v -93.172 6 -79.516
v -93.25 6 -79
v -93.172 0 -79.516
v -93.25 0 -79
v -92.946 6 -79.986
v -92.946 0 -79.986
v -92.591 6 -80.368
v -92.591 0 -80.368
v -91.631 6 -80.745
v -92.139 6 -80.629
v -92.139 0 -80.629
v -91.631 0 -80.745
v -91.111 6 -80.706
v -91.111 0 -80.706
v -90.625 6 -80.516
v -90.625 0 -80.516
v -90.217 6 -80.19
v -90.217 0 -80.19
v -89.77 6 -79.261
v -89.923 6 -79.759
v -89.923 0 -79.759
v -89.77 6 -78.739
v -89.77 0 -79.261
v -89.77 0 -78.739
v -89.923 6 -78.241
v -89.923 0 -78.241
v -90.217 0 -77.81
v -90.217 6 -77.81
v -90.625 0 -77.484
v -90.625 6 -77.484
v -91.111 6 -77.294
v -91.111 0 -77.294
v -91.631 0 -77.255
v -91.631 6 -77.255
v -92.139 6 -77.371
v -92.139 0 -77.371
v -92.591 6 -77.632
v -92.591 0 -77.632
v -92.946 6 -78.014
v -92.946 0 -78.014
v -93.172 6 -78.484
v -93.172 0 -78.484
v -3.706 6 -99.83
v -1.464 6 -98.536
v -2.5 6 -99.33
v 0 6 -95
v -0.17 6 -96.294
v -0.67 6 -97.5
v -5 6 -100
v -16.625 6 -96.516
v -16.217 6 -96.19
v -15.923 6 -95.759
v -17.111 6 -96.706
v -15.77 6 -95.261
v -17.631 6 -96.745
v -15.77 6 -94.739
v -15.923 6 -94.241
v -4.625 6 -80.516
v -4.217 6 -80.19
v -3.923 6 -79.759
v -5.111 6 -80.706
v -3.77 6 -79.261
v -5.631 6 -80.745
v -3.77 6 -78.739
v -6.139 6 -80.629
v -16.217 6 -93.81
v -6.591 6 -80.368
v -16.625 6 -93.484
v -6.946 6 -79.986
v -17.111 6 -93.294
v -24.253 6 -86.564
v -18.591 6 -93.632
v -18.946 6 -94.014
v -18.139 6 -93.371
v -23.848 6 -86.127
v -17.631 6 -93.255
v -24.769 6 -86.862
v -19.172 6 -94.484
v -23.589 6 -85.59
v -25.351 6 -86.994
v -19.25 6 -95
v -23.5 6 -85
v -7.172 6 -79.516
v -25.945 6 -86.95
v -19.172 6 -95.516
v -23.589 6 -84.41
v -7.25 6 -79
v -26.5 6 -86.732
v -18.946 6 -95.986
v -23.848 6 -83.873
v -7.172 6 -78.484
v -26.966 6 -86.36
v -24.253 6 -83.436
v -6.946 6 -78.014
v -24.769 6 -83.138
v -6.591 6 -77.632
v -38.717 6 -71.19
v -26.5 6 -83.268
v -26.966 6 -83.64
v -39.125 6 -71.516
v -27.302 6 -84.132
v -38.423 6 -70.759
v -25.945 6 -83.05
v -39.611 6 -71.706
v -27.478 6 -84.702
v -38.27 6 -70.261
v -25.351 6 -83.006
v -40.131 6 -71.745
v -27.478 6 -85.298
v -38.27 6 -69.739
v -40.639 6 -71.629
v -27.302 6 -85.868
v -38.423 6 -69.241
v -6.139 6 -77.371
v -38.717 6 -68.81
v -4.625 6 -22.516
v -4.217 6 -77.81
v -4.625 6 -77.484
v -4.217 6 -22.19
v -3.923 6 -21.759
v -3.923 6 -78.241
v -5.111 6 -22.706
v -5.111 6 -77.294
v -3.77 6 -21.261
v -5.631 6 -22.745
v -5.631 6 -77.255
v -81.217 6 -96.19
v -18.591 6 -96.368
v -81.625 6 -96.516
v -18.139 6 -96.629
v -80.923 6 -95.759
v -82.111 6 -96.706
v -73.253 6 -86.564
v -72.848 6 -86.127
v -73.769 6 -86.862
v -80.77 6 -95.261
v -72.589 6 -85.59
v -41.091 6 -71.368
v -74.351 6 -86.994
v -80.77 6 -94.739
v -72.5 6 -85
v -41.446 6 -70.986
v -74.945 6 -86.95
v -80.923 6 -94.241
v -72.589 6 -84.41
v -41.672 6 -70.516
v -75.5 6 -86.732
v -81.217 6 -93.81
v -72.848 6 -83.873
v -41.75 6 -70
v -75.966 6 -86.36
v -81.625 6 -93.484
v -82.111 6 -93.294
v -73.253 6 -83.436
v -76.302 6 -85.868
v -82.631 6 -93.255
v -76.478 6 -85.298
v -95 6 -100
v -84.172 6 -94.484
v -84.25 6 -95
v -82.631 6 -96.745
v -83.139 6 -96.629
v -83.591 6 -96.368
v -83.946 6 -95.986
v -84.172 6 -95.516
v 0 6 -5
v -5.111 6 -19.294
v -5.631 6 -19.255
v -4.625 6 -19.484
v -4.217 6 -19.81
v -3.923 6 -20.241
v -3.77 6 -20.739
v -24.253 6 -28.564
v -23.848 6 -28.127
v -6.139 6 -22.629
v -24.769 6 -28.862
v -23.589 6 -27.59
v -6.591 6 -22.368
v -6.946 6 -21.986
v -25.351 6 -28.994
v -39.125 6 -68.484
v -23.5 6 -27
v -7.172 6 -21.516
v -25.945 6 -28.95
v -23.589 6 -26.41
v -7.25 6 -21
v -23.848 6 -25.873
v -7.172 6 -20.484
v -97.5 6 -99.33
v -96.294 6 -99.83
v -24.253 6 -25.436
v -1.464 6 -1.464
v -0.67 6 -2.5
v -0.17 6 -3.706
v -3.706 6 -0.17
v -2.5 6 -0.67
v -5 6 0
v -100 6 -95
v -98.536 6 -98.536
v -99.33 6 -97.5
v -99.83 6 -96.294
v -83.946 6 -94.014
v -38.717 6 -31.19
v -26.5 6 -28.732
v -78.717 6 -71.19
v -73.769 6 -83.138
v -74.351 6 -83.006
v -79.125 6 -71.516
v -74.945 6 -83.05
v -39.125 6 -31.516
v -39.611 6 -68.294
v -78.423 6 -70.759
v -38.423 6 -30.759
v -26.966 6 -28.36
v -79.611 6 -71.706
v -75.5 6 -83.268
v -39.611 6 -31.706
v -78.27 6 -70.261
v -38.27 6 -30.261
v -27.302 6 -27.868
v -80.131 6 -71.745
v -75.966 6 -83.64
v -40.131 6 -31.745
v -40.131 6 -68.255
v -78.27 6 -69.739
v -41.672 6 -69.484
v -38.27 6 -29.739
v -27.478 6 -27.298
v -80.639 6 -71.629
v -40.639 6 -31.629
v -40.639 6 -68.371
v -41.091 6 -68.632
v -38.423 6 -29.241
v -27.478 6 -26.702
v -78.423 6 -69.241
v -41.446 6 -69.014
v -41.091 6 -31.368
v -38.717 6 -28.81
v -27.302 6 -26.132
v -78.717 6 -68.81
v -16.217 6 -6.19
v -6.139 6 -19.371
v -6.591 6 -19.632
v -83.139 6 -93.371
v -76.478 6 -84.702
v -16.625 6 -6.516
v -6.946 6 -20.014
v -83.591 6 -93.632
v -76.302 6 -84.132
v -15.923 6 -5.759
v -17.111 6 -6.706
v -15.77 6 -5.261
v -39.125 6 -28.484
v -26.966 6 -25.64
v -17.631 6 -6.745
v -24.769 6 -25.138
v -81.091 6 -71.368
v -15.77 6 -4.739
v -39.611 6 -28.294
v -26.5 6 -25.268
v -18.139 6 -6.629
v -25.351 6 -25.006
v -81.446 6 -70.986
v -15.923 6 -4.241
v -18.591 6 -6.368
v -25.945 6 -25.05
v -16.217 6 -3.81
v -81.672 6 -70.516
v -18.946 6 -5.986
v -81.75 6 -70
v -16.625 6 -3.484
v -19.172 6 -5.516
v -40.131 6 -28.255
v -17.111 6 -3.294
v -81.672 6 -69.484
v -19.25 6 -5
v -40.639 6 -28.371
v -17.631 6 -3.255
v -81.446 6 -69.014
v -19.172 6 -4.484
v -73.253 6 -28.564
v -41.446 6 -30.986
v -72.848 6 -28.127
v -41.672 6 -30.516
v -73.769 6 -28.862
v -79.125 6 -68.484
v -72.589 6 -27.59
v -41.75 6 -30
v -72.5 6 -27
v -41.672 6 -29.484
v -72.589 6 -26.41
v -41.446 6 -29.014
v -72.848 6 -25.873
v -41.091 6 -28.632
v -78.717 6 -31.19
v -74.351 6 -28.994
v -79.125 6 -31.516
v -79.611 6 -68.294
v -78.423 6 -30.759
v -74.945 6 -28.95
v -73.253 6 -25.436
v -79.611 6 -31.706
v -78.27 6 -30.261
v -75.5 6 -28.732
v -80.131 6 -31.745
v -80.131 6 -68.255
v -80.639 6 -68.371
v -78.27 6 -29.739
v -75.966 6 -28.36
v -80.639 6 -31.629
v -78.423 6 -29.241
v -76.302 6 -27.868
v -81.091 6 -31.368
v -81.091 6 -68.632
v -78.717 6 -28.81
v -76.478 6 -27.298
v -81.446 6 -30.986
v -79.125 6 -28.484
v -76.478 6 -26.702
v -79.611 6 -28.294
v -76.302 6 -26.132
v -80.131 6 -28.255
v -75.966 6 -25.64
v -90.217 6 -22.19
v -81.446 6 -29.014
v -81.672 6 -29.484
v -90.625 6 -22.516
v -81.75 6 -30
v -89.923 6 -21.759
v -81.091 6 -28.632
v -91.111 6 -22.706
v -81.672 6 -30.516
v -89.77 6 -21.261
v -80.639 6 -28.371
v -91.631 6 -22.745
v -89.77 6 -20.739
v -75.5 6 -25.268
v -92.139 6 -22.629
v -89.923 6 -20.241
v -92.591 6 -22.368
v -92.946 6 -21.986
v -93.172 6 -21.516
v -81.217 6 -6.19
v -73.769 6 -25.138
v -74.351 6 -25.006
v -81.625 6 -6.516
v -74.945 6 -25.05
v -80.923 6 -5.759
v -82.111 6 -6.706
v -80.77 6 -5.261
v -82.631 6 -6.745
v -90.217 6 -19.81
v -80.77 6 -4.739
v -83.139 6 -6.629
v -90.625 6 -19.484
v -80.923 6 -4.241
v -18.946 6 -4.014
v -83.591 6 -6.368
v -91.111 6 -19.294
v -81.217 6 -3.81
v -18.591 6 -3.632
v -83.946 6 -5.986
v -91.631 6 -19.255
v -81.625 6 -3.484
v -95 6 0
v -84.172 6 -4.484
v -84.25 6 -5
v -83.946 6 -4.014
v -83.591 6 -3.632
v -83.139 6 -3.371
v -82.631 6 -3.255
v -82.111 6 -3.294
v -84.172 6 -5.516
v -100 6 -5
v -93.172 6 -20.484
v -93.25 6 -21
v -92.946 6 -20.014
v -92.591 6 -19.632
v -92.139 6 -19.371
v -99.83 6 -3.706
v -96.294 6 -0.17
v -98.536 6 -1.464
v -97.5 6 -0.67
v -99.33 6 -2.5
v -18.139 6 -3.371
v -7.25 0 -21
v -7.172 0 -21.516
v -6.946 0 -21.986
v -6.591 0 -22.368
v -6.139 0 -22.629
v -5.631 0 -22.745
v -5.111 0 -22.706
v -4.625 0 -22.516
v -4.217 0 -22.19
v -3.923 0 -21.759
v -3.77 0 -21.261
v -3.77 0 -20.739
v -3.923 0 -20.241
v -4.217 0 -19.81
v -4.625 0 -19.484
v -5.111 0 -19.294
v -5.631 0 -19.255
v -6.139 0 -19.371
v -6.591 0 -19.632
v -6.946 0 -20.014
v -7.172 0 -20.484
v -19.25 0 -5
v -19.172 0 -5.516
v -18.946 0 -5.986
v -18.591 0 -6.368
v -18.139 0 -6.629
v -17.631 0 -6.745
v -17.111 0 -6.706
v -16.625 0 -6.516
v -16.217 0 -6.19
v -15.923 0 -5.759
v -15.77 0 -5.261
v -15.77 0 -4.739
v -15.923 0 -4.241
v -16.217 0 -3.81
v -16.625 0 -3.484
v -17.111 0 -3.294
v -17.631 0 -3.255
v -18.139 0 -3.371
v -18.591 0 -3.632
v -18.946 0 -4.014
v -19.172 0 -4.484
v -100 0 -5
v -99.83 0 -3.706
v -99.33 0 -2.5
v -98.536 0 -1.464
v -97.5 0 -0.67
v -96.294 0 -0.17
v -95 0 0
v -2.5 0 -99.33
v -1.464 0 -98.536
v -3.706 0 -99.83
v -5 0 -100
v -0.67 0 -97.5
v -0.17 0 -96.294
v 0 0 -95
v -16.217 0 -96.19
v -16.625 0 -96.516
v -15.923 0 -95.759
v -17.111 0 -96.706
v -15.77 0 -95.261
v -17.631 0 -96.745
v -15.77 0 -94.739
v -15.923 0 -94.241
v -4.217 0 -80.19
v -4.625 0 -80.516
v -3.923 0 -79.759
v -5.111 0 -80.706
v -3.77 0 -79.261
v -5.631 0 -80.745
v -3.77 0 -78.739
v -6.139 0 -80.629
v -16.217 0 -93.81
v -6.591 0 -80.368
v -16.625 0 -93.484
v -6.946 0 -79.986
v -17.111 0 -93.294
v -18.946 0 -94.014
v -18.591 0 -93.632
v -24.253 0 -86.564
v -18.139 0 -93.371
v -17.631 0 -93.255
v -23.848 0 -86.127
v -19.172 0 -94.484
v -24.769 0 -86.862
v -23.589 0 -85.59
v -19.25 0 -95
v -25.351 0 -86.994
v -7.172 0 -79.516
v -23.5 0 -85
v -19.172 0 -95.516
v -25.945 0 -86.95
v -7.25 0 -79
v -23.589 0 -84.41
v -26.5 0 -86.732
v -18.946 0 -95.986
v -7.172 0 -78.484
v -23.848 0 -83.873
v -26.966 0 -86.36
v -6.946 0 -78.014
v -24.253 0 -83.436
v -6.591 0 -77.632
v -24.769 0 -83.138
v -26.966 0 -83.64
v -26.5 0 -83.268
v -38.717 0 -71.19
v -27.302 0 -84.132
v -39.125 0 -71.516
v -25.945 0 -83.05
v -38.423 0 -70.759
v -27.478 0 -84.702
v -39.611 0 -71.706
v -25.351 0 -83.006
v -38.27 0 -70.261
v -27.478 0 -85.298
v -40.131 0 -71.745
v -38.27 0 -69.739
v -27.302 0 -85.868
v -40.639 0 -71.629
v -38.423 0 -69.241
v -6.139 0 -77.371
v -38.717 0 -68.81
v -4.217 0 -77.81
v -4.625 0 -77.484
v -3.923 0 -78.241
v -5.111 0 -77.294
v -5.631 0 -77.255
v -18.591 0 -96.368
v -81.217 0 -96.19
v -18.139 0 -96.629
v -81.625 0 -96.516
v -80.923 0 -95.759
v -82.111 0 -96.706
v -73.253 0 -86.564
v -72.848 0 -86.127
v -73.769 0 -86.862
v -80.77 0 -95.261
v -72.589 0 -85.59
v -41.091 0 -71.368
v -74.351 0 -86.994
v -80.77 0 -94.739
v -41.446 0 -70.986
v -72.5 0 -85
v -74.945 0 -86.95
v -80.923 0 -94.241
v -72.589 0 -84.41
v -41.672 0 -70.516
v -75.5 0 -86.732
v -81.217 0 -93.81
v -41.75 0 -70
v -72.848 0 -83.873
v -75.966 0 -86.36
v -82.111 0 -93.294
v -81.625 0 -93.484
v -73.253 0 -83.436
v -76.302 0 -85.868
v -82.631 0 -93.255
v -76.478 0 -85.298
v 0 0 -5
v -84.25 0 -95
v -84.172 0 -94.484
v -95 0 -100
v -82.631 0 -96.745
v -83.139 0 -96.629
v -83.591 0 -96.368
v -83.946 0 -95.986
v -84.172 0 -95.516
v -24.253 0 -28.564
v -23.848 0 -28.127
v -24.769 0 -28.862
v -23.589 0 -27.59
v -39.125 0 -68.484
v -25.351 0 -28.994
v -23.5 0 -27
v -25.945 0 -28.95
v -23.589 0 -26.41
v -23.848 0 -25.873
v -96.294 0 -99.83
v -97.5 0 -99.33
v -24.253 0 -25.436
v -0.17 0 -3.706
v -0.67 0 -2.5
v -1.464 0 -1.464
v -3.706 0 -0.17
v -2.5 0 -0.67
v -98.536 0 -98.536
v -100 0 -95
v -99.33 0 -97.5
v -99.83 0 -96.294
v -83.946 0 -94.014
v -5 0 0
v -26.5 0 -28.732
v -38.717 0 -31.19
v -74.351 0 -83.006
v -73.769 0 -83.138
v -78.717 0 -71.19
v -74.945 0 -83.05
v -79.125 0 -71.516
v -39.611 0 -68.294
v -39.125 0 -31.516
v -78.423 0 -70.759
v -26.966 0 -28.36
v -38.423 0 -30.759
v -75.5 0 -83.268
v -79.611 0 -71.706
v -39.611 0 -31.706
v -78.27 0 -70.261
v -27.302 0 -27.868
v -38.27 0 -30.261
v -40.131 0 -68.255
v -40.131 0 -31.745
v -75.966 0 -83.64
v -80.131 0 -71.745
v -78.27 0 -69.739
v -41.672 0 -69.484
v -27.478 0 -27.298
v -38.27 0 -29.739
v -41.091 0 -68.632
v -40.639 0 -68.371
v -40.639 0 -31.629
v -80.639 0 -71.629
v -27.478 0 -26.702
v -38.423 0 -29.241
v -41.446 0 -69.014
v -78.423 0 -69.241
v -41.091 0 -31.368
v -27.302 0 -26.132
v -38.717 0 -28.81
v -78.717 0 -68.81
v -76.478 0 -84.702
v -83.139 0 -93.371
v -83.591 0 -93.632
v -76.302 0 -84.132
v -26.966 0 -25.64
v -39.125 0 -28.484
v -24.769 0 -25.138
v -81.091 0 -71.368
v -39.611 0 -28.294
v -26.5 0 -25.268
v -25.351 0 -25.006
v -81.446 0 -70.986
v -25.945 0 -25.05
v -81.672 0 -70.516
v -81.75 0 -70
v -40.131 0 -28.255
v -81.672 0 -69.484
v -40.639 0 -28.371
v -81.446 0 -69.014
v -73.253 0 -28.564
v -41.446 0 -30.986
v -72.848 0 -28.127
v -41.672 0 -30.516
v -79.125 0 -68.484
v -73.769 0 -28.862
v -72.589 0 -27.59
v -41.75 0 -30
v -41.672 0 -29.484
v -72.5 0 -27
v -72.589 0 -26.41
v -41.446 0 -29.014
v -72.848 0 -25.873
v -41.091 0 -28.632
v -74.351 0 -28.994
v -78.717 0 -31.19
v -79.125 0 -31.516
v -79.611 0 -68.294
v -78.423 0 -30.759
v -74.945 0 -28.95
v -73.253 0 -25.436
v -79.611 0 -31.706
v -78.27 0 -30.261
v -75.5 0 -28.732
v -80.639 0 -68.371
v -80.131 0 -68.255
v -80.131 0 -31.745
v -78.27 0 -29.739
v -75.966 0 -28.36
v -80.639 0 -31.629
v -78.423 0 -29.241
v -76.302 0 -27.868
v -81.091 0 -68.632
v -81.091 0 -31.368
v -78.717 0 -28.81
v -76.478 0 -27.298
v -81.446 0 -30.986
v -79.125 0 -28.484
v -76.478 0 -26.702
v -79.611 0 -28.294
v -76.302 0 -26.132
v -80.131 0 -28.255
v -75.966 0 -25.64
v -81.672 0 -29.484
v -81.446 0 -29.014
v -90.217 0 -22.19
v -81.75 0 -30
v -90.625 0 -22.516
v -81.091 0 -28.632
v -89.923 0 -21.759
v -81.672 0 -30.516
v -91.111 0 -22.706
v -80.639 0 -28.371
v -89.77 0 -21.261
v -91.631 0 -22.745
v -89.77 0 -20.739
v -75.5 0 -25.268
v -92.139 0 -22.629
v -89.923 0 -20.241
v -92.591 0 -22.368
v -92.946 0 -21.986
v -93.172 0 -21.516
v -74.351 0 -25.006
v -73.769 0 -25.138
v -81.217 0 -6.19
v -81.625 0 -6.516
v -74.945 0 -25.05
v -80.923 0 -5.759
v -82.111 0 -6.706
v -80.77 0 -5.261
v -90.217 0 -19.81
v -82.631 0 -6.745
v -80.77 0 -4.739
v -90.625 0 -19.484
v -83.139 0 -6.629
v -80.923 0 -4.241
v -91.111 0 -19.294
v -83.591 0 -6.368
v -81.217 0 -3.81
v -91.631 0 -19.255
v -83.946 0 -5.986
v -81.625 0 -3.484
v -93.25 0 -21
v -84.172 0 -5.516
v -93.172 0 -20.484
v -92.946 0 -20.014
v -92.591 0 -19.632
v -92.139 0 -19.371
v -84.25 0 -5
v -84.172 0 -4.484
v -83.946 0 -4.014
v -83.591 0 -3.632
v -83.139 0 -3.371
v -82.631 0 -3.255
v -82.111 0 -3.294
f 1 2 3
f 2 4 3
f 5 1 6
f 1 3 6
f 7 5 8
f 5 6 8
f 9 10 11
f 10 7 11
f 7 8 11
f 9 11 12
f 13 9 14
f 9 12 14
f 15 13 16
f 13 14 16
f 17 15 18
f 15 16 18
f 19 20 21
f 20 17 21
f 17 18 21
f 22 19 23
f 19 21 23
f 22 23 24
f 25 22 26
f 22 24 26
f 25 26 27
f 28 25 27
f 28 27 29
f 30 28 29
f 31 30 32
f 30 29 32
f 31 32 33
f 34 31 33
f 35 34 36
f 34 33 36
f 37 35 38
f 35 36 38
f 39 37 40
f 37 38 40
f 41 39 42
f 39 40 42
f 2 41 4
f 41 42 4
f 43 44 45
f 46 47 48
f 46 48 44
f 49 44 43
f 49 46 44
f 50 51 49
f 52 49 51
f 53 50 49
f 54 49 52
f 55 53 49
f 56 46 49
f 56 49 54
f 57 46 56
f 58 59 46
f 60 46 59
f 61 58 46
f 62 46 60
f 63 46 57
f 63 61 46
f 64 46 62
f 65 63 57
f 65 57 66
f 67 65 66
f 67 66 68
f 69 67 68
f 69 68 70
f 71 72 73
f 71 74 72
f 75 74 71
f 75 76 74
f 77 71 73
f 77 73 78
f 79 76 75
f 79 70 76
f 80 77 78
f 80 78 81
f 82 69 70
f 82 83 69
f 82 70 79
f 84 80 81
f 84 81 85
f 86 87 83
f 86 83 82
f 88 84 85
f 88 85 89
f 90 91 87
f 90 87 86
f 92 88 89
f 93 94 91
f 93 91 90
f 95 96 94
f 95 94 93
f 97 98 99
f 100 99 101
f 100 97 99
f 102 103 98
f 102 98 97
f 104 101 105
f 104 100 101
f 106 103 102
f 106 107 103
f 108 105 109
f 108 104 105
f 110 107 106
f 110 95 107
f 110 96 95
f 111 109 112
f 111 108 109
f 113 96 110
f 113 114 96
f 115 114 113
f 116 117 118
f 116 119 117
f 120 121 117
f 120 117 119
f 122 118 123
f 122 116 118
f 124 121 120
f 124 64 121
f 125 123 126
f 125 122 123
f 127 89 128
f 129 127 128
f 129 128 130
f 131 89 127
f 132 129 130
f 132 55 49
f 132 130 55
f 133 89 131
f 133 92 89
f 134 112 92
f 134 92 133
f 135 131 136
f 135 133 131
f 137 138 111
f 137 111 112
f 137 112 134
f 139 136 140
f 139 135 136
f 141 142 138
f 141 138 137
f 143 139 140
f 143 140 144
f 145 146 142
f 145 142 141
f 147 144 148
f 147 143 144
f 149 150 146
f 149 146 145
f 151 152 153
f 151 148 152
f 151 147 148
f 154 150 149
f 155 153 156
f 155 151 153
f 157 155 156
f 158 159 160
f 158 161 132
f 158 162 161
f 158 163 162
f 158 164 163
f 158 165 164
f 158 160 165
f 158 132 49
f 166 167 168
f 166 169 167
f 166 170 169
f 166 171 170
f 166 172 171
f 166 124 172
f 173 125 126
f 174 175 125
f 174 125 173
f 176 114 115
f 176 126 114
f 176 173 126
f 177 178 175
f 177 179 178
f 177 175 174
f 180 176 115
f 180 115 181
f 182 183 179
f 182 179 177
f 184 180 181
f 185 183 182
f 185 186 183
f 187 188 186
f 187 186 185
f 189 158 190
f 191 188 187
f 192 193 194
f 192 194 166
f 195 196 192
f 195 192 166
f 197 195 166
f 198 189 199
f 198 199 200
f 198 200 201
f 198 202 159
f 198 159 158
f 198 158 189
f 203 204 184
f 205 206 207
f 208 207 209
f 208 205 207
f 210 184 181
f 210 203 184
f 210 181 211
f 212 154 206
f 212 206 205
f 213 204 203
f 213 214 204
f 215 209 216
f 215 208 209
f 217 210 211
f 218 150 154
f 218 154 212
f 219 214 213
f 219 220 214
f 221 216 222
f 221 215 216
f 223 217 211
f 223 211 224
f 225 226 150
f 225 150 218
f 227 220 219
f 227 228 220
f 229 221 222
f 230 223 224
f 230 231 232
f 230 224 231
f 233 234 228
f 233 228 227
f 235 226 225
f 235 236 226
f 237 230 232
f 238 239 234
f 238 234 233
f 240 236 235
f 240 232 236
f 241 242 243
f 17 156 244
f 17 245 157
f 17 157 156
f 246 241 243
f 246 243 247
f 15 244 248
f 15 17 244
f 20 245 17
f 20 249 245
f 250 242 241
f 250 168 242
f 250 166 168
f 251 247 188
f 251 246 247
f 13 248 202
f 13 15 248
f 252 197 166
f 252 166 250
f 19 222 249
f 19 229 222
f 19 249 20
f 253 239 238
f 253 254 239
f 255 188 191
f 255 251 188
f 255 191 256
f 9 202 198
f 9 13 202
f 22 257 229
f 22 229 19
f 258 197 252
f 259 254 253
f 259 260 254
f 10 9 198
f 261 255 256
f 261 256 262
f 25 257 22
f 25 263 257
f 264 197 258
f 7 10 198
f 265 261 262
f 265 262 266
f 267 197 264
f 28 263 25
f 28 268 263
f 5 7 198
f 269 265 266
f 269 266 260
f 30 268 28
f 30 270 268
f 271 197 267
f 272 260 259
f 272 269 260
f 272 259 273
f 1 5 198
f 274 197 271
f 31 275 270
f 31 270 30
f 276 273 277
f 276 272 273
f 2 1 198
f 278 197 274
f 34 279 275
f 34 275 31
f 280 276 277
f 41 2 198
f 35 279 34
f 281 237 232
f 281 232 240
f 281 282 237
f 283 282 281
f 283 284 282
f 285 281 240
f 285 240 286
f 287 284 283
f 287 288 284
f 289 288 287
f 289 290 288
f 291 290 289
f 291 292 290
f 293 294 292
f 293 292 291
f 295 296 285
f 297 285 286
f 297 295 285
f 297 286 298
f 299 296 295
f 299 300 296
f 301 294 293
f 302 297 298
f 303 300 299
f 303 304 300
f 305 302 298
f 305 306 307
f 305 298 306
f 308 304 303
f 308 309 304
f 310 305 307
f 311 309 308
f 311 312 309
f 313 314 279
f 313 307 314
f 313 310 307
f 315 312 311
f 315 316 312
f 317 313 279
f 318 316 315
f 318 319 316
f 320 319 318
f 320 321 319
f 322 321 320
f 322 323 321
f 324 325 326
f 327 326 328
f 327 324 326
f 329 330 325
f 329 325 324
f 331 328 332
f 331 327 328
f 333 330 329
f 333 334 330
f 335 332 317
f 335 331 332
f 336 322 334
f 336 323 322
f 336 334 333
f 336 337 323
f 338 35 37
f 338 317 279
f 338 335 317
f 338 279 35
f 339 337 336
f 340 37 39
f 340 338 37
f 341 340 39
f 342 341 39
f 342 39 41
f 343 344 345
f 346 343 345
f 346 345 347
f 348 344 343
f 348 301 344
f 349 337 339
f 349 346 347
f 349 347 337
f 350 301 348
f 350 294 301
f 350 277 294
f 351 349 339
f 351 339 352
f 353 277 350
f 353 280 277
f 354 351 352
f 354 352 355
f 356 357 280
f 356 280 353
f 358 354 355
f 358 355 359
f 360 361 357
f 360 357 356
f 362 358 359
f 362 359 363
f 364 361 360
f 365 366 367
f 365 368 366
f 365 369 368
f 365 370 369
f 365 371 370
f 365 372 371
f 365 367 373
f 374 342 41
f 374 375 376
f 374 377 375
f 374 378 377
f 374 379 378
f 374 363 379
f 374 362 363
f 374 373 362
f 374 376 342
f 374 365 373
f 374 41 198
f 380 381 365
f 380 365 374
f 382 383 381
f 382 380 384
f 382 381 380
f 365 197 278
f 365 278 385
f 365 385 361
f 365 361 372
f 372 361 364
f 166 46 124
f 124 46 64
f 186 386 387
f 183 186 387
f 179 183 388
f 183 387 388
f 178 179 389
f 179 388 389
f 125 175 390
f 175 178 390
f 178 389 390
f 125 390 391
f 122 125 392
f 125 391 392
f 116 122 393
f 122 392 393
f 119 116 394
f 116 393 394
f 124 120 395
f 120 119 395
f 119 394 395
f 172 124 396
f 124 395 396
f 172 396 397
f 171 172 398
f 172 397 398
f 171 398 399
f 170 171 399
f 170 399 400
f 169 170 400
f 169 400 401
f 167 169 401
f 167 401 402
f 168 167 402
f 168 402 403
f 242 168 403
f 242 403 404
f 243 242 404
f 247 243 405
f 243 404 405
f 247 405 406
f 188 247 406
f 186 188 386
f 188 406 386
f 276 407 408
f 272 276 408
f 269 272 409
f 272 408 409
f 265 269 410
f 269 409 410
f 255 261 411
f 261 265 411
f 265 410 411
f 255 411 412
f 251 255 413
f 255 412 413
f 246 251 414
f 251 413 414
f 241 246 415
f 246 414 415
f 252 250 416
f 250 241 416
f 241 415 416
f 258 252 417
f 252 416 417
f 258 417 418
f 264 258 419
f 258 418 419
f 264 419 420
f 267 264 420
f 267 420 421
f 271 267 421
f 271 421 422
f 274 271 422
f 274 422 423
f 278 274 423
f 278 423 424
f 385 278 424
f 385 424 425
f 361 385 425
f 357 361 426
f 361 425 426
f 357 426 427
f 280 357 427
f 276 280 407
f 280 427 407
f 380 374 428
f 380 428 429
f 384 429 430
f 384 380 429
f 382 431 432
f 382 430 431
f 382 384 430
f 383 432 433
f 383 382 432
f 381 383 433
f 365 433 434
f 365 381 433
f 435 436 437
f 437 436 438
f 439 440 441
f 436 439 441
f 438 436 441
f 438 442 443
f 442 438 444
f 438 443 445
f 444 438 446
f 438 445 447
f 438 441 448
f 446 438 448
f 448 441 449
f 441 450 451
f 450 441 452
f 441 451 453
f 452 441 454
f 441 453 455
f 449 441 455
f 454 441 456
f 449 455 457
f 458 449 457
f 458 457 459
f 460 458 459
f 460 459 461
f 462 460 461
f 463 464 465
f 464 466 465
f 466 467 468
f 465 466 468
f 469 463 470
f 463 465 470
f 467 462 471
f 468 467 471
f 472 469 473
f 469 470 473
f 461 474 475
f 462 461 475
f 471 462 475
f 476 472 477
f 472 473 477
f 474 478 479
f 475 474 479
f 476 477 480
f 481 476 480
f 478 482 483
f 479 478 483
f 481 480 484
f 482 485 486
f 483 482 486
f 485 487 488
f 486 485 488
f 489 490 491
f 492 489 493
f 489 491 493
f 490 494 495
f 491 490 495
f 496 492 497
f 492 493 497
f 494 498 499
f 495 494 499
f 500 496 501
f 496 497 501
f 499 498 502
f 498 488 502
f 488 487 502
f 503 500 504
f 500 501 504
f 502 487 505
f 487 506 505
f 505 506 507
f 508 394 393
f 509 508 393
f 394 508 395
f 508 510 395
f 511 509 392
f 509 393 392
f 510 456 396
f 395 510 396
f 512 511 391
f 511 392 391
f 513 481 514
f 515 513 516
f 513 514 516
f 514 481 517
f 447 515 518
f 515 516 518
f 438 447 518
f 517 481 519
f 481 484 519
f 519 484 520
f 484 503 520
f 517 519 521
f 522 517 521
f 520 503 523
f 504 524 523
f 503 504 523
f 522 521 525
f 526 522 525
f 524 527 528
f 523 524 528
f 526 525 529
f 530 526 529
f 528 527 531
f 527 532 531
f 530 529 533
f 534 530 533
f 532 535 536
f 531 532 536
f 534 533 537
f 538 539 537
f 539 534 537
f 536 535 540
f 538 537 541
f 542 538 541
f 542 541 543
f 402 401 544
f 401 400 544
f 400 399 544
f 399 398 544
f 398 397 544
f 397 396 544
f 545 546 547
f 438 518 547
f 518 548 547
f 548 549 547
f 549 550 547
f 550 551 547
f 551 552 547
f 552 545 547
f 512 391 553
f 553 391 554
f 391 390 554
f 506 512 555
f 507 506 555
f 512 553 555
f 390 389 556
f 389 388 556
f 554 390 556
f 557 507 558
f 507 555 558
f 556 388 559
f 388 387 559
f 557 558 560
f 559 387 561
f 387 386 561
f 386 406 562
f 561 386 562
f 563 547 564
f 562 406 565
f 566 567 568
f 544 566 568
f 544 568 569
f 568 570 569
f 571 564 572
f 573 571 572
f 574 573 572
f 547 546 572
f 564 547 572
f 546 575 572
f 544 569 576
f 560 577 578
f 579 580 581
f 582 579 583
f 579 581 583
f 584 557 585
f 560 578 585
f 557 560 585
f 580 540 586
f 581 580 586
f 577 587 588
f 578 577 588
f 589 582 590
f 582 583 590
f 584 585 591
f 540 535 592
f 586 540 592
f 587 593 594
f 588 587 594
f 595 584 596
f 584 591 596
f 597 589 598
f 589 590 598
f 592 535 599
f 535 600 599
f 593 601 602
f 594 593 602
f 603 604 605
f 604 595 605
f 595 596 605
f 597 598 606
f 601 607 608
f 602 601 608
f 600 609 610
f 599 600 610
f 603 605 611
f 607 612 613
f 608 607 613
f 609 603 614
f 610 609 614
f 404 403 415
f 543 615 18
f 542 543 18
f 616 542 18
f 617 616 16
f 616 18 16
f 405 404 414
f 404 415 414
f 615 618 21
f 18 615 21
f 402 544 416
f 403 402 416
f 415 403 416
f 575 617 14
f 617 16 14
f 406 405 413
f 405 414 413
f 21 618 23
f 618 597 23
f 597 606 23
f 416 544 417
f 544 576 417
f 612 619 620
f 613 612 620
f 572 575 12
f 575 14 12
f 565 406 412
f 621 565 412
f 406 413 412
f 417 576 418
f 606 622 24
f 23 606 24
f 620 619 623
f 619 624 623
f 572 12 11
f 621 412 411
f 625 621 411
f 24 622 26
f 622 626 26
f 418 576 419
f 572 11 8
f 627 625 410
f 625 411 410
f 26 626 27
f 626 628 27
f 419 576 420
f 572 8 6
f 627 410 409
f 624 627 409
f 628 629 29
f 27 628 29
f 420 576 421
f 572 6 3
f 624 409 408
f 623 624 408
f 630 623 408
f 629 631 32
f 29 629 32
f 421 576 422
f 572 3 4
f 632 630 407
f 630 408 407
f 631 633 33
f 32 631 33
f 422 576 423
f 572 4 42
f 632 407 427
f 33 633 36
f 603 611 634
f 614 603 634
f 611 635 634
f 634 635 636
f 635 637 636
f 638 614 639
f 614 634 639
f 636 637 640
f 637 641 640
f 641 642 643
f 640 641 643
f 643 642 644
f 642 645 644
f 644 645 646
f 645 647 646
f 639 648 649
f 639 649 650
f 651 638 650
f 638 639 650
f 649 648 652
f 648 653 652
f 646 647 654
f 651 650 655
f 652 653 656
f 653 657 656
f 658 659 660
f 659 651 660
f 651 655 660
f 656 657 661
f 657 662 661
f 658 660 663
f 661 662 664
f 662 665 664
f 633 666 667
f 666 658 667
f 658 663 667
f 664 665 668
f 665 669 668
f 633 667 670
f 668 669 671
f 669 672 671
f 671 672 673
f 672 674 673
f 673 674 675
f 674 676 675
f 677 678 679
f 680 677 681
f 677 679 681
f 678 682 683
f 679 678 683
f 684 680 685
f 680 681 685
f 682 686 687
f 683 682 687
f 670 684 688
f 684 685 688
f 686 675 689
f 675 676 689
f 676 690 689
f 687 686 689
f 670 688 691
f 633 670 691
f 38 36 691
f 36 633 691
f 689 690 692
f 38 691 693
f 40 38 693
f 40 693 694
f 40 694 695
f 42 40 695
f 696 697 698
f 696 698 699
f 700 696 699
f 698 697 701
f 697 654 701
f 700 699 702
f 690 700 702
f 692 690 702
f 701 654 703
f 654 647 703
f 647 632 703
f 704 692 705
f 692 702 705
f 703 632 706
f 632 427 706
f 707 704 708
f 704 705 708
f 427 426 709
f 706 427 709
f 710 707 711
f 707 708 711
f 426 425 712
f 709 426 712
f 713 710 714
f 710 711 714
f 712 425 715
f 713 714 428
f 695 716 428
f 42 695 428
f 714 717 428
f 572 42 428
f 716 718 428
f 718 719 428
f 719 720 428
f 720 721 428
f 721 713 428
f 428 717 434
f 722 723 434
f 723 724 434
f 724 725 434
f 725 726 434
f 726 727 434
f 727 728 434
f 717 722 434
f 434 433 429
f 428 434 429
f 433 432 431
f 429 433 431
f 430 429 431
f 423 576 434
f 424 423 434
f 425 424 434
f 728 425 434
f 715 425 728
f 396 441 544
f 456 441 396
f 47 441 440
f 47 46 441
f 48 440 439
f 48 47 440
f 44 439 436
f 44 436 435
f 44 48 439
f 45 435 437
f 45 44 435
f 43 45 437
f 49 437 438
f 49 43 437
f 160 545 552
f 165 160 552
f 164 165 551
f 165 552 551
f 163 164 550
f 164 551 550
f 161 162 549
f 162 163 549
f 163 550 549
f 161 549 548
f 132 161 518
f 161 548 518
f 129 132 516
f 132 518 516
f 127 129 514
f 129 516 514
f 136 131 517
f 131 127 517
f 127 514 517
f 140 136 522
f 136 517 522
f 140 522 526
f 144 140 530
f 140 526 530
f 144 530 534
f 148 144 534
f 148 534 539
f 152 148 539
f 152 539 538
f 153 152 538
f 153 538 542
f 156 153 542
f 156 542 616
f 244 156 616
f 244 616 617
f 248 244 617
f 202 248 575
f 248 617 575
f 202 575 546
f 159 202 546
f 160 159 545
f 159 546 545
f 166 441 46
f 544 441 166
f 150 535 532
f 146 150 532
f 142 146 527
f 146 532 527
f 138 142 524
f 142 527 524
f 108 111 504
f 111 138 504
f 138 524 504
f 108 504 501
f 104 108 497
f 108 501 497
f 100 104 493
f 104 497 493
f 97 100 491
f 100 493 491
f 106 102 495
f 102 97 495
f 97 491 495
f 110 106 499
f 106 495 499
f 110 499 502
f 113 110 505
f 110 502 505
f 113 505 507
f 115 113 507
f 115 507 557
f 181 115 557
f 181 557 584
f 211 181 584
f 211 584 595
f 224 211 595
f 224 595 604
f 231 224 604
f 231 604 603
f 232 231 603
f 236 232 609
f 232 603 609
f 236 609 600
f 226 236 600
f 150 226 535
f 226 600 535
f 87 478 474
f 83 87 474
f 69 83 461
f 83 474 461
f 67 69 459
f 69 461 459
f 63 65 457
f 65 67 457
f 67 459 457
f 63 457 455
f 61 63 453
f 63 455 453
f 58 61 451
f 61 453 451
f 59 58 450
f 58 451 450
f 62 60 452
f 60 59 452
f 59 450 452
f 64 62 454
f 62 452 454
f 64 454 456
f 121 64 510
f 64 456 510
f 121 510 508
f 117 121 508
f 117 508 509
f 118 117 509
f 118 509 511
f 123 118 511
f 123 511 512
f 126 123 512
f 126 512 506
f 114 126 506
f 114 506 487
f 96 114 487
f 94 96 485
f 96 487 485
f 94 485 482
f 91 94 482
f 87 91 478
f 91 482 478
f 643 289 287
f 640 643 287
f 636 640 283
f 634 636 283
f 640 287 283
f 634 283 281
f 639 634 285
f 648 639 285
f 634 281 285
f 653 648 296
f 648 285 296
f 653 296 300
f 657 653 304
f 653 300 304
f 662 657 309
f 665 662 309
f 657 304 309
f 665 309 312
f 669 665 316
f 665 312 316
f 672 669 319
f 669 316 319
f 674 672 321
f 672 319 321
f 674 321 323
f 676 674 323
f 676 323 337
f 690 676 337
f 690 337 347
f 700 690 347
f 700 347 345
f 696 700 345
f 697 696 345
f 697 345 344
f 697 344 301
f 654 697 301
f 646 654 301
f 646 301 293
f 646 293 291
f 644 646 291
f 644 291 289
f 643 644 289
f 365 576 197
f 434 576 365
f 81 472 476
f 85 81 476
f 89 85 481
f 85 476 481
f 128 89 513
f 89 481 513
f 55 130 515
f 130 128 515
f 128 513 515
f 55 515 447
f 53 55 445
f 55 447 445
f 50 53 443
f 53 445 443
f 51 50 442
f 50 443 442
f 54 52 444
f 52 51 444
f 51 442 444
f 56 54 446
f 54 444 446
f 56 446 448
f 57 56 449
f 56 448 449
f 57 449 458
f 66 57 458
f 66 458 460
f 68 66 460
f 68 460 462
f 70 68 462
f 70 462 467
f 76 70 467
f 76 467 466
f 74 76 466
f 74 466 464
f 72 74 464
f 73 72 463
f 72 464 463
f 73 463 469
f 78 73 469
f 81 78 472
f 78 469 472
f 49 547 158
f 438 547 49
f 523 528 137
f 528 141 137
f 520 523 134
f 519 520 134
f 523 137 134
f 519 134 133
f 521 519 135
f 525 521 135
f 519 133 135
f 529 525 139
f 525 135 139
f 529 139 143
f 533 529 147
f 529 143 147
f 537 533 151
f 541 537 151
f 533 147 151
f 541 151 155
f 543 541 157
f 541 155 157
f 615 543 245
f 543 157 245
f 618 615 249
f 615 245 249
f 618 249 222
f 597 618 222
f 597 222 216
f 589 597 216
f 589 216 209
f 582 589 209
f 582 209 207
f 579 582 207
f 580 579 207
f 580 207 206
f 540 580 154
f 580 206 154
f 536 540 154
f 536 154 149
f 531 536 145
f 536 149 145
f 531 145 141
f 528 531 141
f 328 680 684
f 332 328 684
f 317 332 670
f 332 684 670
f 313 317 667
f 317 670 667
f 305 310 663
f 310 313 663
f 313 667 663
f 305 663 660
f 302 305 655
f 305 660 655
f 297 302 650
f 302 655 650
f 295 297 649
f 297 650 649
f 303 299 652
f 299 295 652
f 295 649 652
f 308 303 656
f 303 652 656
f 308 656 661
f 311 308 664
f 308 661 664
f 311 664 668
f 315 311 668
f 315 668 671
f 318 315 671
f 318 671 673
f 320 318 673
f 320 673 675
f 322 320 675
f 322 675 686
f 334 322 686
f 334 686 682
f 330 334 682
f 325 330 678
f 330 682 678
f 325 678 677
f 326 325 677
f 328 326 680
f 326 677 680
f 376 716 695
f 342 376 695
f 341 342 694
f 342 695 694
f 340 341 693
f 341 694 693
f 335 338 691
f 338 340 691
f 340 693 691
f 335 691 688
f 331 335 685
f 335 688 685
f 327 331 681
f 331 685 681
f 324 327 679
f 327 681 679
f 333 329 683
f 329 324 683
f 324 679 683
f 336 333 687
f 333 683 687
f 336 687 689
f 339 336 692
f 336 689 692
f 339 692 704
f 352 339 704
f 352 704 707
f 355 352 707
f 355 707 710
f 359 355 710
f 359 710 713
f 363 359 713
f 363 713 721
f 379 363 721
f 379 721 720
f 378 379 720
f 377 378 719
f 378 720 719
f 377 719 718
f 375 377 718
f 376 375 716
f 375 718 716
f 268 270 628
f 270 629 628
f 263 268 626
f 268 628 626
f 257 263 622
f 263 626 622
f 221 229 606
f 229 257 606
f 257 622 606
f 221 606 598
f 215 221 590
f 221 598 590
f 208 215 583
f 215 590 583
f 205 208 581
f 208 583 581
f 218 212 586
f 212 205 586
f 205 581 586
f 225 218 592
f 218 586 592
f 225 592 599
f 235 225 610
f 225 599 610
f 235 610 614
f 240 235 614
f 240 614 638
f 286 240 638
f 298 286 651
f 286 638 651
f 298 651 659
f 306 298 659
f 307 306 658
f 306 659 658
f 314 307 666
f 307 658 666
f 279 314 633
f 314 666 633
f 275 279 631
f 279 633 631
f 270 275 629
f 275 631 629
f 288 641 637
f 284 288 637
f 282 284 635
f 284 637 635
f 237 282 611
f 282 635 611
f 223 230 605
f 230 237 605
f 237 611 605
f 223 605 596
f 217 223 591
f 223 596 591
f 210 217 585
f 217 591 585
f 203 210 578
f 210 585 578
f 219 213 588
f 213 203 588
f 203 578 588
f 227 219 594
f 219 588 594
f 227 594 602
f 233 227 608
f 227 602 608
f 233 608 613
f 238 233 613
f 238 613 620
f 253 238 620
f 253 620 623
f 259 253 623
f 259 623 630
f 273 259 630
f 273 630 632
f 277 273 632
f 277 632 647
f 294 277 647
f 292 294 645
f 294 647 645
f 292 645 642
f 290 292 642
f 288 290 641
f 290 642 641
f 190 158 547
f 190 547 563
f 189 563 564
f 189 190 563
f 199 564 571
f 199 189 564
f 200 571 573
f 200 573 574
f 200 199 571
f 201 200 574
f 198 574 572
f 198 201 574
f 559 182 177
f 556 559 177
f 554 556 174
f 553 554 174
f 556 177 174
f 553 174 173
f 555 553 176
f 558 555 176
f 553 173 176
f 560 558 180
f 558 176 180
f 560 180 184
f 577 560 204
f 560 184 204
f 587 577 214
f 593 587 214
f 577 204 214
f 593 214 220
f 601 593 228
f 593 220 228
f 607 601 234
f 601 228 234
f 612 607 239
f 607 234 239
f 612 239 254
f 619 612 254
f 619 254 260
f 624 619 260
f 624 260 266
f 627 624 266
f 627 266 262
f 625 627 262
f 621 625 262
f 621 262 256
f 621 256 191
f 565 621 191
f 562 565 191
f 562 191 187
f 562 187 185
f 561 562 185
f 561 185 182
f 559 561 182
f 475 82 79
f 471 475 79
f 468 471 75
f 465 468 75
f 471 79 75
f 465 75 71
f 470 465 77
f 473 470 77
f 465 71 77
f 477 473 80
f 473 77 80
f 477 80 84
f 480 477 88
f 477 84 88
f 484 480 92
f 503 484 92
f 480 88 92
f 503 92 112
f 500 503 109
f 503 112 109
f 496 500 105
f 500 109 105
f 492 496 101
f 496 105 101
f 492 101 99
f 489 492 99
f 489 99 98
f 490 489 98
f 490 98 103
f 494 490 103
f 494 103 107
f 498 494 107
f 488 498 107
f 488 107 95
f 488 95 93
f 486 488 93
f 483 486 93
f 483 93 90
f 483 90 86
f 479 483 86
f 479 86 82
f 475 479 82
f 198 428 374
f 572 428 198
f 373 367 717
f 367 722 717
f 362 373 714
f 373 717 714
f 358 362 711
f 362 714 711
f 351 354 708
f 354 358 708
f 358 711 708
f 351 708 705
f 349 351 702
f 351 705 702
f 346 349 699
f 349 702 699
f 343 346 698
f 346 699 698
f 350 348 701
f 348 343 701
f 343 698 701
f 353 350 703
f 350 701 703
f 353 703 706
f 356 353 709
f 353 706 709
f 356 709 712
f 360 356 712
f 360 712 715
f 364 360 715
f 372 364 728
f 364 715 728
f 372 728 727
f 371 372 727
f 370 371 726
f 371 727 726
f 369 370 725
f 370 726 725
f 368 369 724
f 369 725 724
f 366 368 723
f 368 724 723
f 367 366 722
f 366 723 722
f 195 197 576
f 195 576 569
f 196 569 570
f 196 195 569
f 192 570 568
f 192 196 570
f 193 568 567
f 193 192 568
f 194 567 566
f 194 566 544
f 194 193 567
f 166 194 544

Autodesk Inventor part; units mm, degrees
ref_plane "YZ Plane" through (0, 0, 0) normal (1, 0, 0) x (0, 1, 0)
ref_plane "XZ Plane" through (0, 0, 0) normal (0, 1, 0) x (-1, 0, 0)
ref_plane "XY Plane" through (0, 0, 0) normal (0, 0, 1) x (1, 0, 0)
sketch "Sketch2" plane through (0, 0, 0) normal (0, 1, 0) x (-1, 0, 0)
  line L0 (0, 0) -> (100, 0)
  line L1 (100, 0) -> (100, -100)
  line L2 (100, -100) -> (0, -100)
  line L3 (0, -100) -> (0, 0)
  circle A0 centre (82.5, -5) radius 1.75
  circle A1 centre (82.5, -95) radius 1.75
  circle A2 centre (17.5, -5) radius 1.75
  circle A3 centre (17.5, -95) radius 1.75
  circle A4 centre (80, -30) radius 1.75
  circle A5 centre (91.5, -21) radius 1.75
  circle A6 centre (91.5, -79) radius 1.75
  circle A7 centre (5.5, -21) radius 1.75
  circle A8 centre (5.5, -79) radius 1.75
  line L4 (50, 0) -> (50, -100)
  circle A9 centre (40, -30) radius 1.75
  circle A10 centre (80, -70) radius 1.75
  circle A11 centre (40, -70) radius 1.75
  dimension "d13" = 100
  dimension "d14" = 100
  dimension "d15" = 3.5
  dimension "d16" = 17.5
  dimension "d17" = 5
  dimension "d20" = 90
  dimension "d23" = 65
  dimension "d26" = 3.5
  dimension "d27" = 20
  dimension "d28" = 30
  dimension "d32" = 3.5
  dimension "d35" = 58
  dimension "d38" = 86
  dimension "d41" = 8.5
  dimension "d42" = 21
  dimension "d51" = 40
  dimension "d54" = 40
extrude "Extrusion2" add sketch "Sketch2" along normal blind 6
fillet "Fillet2" radius 5 4 edges at (0, 3, -100) (-100, 3, -100) (0, 3, 0) (-100, 3, 0)
sketch "Sketch3" plane through (0, 6, 0) normal (0, 1, 0) x (1, 0, 0)
  circle A0 centre (-74.5, 27) radius 2
  line L0 (-100, 95) -> (-100, 5) projected
  line L1 (-95, 0) -> (-5, 0) projected
  circle A1 centre (-25.5, 27) radius 2
  circle A2 centre (-74.5, 85) radius 2
  circle A3 centre (-25.5, 85) radius 2
  point P0 (0, 0)
  dimension "d57" = 4
  dimension "d58" = 25.5
  dimension "d59" = 27
  dimension "d62" = 49
  dimension "d65" = 58
extrude "Extrusion3" cut sketch "Sketch3" against normal through all
properties part number "EboxMounting_Plate"
